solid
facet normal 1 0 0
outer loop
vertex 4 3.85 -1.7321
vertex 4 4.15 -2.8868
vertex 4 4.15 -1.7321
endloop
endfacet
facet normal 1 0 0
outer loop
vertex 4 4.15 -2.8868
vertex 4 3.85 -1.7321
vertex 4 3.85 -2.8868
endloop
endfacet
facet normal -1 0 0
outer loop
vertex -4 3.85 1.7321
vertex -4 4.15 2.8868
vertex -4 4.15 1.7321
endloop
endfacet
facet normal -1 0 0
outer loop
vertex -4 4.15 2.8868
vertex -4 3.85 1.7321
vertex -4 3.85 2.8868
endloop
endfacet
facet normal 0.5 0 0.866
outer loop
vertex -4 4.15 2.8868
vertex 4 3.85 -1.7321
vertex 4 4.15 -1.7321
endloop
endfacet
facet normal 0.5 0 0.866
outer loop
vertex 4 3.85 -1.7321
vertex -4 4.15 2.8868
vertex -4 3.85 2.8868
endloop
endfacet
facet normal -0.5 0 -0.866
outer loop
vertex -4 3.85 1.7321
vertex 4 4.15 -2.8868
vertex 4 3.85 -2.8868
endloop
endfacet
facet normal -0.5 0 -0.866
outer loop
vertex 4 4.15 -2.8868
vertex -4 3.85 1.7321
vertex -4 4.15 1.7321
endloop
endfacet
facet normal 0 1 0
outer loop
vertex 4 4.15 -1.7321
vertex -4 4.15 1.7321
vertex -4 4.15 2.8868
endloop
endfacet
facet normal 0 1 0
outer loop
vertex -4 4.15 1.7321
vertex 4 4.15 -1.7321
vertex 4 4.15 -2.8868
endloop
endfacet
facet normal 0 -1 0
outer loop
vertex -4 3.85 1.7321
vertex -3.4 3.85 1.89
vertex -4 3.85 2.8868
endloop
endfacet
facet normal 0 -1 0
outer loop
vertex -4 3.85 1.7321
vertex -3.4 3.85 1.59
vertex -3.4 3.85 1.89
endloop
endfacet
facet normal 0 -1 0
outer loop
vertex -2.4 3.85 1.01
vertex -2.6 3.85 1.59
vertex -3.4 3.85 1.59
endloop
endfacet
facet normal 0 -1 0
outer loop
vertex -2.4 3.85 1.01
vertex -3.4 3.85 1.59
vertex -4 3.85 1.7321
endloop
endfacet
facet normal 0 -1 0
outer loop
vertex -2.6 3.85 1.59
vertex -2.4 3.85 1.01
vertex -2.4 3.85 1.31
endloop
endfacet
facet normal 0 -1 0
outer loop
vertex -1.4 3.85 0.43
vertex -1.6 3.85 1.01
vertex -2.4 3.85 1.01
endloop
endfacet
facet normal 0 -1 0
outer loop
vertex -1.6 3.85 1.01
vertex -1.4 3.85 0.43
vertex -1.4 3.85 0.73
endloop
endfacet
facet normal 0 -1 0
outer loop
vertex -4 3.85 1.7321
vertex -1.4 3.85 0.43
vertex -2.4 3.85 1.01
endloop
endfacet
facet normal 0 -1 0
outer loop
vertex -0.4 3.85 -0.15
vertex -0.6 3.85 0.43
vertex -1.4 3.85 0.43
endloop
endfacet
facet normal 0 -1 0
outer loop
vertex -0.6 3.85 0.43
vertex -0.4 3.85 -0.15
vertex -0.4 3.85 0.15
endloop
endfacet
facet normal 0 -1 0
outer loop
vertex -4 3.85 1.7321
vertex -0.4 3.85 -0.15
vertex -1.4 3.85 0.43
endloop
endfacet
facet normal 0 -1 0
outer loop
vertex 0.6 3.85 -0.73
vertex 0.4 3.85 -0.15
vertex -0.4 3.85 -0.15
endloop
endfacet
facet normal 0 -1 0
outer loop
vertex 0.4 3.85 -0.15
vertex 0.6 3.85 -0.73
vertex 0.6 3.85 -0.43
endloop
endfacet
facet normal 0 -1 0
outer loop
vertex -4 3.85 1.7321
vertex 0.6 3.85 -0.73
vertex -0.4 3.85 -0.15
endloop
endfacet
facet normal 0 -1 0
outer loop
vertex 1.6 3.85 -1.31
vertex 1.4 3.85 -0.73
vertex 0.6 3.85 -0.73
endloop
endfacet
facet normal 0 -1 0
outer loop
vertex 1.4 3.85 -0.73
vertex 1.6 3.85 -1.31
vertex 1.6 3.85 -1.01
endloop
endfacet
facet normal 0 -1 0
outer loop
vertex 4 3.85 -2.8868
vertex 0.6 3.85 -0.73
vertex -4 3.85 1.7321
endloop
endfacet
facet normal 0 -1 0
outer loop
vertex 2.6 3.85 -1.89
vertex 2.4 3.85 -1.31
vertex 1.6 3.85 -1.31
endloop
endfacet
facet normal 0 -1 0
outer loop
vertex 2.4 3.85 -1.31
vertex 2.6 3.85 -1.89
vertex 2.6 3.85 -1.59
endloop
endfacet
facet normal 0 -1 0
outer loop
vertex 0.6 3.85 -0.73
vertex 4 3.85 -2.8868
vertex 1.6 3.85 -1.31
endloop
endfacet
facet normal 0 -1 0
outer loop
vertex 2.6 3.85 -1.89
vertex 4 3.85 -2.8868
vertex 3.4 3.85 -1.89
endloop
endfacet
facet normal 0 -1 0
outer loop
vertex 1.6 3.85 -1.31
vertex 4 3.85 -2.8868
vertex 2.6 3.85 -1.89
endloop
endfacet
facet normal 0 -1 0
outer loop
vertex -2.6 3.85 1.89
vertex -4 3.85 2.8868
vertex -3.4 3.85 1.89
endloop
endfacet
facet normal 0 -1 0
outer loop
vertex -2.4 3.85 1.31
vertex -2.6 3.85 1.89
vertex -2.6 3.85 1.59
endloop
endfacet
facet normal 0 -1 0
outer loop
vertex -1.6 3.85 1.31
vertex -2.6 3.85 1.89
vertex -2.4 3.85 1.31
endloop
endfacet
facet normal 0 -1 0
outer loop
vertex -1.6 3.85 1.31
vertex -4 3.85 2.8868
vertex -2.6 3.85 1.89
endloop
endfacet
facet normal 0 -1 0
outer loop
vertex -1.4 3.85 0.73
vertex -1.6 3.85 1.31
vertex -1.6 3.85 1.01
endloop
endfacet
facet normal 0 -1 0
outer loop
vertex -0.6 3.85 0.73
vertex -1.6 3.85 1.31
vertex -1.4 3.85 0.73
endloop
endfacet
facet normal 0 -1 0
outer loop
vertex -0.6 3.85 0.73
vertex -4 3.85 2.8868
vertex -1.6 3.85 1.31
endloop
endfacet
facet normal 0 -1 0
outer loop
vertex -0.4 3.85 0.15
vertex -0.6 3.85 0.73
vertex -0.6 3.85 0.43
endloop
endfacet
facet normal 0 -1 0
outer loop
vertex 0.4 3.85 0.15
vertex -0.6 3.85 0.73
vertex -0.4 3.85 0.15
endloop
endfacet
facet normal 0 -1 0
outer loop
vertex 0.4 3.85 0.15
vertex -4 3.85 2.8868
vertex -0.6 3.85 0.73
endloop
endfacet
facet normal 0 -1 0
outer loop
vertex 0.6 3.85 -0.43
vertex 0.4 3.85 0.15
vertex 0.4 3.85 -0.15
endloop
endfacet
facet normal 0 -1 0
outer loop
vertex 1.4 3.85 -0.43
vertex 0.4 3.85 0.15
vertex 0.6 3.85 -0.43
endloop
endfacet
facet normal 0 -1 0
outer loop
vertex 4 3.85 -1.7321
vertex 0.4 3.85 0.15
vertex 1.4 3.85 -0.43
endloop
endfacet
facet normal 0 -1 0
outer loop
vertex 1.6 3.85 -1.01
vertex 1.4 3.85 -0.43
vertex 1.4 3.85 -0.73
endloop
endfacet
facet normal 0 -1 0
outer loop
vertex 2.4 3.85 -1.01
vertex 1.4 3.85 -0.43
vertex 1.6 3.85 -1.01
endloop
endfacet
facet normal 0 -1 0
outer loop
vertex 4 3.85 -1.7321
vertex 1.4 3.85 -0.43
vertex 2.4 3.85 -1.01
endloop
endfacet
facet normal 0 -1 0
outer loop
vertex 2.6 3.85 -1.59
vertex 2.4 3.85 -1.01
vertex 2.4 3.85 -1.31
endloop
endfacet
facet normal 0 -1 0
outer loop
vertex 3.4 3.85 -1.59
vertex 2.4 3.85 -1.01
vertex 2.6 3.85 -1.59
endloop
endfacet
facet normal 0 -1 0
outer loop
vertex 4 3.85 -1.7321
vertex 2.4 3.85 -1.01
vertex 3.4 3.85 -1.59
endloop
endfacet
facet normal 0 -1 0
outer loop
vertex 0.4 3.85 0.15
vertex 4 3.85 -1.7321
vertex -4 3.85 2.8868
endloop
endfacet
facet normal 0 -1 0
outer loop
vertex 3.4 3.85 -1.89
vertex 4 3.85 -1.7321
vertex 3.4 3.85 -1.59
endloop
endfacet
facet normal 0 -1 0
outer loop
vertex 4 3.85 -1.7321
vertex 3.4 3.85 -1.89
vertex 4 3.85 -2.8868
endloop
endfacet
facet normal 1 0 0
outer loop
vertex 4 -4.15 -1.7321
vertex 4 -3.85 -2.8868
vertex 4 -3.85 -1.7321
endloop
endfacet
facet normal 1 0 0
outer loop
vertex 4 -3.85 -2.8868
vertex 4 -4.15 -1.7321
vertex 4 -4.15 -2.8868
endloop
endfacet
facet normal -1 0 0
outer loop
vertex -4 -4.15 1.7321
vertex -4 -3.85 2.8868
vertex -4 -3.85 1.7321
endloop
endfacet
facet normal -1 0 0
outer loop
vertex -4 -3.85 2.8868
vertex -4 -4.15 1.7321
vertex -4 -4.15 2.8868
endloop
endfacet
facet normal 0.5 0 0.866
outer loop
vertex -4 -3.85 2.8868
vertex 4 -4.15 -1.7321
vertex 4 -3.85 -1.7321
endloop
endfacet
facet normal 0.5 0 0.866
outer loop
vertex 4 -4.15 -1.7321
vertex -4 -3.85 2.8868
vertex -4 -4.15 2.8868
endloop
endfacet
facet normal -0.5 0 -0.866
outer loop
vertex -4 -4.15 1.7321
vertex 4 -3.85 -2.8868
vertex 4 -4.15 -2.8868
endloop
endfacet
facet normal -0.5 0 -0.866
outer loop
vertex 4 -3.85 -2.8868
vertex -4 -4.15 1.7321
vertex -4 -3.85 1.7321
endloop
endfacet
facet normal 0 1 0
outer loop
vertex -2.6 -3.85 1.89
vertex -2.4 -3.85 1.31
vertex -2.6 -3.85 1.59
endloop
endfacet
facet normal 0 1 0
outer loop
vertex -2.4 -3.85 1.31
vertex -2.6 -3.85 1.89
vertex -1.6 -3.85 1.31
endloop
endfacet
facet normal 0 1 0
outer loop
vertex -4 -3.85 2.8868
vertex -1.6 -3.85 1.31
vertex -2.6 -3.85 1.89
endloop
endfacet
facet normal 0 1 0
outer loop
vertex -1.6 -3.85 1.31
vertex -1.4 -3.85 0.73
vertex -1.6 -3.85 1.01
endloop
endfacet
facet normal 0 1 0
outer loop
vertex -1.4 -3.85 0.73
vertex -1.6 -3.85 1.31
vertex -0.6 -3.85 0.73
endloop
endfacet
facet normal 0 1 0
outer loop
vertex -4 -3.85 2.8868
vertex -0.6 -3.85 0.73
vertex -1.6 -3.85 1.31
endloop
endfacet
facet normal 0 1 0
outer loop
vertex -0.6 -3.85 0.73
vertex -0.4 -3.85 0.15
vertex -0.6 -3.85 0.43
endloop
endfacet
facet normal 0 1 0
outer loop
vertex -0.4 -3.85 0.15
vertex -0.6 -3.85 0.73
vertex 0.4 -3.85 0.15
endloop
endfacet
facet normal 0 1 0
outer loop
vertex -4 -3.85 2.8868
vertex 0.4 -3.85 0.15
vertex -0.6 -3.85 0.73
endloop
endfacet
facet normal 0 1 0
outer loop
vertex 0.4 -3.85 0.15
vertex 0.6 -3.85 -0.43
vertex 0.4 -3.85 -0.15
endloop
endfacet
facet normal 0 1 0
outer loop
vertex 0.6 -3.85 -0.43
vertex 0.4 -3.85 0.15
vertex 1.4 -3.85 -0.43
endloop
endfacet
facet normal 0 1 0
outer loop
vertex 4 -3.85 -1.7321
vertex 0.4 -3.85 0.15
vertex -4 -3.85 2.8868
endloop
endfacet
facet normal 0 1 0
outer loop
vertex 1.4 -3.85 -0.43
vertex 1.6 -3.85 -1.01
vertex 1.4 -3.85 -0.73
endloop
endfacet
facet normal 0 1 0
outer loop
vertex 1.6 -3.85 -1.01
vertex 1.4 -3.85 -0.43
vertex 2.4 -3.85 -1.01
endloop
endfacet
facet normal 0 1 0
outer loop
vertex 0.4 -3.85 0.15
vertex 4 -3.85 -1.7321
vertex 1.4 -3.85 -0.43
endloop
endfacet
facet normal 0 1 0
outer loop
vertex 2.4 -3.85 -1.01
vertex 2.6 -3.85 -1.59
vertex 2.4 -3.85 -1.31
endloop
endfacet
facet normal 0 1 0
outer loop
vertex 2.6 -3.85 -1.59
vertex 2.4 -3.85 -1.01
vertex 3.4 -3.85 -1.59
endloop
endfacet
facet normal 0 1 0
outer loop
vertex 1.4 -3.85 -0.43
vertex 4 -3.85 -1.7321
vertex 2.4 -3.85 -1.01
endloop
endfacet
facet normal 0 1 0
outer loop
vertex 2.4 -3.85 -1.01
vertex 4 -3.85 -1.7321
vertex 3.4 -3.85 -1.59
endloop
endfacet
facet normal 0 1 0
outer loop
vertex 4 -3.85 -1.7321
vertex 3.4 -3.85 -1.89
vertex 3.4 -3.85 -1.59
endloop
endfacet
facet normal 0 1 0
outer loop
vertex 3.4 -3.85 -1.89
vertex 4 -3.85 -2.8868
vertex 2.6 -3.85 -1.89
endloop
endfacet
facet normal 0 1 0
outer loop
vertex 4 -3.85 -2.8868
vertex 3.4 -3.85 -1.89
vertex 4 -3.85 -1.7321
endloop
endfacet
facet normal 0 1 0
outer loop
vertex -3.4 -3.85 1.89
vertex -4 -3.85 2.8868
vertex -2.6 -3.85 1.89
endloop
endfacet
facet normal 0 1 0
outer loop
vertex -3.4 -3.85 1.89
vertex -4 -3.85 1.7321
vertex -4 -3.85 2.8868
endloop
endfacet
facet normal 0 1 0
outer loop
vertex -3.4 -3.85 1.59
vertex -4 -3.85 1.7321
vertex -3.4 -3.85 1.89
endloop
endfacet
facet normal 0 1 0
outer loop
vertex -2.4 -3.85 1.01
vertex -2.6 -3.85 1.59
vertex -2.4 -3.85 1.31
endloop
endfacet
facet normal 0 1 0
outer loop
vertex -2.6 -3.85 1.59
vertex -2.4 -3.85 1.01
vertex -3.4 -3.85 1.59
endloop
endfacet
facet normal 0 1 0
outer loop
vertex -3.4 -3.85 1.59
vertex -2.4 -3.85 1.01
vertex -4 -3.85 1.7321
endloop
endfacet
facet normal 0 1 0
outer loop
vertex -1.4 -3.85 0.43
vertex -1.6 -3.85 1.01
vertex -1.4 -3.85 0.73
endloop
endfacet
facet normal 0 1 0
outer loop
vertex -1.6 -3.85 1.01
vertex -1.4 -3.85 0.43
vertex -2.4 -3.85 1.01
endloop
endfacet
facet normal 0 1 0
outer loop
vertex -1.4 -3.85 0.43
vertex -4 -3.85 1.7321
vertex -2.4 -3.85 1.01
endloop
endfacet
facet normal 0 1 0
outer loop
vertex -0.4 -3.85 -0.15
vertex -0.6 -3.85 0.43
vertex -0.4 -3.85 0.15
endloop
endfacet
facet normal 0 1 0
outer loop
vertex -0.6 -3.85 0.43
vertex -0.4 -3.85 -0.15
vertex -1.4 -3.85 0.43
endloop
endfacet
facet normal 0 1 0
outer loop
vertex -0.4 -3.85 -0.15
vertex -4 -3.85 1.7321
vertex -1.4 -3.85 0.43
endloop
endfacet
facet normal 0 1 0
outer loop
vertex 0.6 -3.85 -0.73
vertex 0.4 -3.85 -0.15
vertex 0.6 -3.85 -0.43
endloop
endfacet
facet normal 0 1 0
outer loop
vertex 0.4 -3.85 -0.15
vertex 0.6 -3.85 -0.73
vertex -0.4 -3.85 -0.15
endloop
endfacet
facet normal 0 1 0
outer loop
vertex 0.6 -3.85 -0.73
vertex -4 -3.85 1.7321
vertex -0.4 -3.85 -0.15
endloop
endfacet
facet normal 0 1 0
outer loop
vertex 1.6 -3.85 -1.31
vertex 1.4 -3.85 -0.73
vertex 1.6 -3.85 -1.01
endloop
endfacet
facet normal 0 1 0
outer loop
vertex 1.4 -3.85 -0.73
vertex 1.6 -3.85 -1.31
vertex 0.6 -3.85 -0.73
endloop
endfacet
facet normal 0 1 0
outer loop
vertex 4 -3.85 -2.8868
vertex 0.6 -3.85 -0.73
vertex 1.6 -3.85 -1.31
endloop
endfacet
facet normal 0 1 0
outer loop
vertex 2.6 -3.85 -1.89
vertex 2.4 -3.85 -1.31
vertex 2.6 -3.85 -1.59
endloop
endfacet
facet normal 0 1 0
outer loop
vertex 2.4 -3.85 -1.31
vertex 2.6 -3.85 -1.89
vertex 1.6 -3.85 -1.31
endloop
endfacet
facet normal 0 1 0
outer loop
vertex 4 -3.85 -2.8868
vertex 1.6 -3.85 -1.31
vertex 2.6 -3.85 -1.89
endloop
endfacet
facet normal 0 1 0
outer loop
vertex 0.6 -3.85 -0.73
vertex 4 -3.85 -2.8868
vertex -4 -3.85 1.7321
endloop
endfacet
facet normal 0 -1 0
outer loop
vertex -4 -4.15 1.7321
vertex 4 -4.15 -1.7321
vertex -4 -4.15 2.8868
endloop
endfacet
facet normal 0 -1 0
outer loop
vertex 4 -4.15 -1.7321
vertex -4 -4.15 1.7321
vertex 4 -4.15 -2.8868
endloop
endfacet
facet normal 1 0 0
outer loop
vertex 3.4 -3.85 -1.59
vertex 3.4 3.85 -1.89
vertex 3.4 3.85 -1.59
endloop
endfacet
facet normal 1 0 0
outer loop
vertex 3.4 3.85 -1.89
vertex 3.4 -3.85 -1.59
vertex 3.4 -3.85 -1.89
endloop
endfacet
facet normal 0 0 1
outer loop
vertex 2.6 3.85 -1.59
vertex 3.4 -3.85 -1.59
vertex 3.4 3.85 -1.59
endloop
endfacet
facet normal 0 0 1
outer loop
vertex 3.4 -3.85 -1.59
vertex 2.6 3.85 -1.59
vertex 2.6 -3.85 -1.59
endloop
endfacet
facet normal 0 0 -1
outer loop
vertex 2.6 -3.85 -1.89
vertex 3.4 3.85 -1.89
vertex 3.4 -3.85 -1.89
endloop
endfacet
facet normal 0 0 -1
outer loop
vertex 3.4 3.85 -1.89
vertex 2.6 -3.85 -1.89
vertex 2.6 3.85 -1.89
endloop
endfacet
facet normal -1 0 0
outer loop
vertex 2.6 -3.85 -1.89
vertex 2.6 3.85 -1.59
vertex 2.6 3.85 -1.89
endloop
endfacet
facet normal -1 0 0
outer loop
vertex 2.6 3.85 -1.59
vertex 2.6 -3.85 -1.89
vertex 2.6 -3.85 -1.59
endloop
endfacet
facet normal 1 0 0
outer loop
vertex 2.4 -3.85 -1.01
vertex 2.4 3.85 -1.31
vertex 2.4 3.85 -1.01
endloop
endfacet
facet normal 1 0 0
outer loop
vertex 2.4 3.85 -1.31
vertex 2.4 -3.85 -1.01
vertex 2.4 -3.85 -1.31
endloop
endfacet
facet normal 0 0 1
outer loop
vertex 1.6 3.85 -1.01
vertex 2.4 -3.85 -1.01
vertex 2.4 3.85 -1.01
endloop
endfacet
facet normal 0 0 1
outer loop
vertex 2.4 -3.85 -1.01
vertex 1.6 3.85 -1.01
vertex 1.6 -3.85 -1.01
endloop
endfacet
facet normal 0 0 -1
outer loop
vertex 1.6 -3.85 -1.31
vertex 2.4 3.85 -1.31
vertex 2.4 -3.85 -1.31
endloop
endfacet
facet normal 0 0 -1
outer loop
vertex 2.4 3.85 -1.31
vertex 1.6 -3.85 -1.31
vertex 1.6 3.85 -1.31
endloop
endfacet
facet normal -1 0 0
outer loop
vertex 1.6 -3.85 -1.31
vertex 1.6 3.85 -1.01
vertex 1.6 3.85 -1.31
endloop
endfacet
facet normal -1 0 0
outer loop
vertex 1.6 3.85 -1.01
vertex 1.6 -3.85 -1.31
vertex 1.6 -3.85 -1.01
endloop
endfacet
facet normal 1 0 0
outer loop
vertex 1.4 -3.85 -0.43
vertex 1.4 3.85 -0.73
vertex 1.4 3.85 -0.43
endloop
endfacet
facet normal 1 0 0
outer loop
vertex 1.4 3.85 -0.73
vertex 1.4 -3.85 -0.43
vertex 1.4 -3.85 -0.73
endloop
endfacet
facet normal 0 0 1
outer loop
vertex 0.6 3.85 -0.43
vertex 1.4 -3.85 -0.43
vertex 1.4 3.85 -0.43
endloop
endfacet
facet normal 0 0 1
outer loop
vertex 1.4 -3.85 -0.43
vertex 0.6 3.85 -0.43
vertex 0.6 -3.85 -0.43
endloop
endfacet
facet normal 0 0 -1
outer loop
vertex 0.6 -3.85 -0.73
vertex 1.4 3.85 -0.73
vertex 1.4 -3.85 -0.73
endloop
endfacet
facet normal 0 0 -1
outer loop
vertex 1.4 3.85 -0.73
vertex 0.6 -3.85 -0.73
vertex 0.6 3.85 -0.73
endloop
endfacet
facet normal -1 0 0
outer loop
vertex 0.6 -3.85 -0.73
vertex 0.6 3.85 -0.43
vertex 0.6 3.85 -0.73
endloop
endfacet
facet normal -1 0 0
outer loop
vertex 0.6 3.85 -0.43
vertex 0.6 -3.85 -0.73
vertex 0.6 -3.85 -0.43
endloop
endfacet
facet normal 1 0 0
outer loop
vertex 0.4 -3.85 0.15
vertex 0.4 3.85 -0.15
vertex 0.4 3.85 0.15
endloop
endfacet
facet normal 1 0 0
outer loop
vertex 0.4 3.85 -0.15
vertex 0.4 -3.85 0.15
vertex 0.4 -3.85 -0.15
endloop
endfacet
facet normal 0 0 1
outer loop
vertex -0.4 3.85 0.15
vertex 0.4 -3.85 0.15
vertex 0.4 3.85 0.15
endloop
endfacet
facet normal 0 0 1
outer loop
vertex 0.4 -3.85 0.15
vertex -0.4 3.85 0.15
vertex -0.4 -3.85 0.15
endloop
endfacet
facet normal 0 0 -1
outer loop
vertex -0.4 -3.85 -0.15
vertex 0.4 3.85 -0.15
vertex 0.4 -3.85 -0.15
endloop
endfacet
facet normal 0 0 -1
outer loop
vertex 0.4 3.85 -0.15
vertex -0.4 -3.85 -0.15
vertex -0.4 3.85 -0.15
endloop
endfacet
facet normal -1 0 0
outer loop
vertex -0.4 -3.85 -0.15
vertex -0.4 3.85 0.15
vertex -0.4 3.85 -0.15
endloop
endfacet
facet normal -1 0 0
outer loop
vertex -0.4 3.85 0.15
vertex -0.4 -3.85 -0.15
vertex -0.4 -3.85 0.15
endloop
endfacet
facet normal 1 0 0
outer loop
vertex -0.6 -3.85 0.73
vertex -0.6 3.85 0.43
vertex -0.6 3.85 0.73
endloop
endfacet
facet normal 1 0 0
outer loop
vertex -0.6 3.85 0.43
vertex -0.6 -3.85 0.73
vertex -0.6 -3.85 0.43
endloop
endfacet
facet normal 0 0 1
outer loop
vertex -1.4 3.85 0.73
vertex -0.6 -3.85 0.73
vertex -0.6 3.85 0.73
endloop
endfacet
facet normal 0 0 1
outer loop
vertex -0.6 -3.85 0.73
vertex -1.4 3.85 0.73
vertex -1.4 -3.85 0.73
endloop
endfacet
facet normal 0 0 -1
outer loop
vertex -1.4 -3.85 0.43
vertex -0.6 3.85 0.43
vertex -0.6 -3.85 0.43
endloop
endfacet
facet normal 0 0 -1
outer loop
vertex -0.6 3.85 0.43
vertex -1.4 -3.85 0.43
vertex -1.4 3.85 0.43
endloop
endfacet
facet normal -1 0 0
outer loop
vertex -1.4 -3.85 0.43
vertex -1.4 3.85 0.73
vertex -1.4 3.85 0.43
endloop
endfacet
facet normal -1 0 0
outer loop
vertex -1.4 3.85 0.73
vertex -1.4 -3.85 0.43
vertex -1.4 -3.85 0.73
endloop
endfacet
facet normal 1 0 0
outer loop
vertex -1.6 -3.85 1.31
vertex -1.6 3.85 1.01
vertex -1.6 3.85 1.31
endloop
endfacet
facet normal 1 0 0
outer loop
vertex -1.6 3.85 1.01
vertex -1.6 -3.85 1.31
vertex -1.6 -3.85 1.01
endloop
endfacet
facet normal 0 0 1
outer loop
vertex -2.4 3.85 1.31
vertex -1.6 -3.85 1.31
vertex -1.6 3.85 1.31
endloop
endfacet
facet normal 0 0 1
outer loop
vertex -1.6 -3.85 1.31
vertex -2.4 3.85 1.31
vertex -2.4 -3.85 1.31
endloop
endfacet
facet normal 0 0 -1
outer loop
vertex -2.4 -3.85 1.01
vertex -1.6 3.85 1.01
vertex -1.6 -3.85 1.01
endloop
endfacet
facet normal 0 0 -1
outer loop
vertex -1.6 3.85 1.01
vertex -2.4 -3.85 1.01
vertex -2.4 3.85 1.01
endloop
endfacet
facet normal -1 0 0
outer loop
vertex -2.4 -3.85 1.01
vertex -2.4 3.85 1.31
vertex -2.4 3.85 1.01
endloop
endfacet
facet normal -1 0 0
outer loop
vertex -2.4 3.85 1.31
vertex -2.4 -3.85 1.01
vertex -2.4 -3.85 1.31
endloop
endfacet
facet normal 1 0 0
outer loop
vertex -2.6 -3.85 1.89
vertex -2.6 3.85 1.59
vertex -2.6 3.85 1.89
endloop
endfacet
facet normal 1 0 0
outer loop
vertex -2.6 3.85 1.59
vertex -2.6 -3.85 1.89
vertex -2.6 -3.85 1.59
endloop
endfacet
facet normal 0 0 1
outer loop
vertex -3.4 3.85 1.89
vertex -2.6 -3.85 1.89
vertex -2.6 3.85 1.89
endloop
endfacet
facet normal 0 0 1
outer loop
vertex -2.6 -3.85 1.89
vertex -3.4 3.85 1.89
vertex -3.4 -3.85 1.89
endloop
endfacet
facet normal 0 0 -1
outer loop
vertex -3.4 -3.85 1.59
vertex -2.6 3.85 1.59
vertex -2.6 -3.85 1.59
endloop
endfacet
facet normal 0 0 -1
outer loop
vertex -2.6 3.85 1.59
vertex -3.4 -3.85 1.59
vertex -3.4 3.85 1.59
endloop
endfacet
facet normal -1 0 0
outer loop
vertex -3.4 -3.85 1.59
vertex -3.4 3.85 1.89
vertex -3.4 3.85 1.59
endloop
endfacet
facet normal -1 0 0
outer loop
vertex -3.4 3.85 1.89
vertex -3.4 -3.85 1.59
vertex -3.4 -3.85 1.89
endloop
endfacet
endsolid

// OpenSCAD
module Ladder_02(){
        
    module Rail(){
       intersection(){
       cube([8,8,8], center = true);
       rotate([0,30,0])
       cube([16,0.3,1], center = true);     
        }    
    }

    color("#8E5F3A"){
    translate([0,4,0])
    Rail();

    translate([0,-4,0])
    Rail();
    
    } 
    color("#d68f58"){
    for (i=[-3:1:3]) {
          translate([-i,0,i*0.58])
          cube([0.8,8,0.3], center = true);

        }
    }
}

Ladder_02();

// Written by Nicolì Angelo (Gengio) 2024: 
// MIT License

//Permission is hereby granted, free of charge, to any person obtaining a copy of this software and associated documentation files (the "Software"), to deal in the Software without restriction, including without limitation the rights to use, copy, modify, merge, publish, distribute, sublicense, and/or sell copies of the Software, and to permit persons to whom the Software is furnished to do so, subject to the following conditions:

//The above copyright notice and this permission notice shall be included in all copies or substantial portions of the Software.

//THE SOFTWARE IS PROVIDED "AS IS", WITHOUT WARRANTY OF ANY KIND, EXPRESS OR IMPLIED, INCLUDING BUT NOT LIMITED TO THE WARRANTIES OF MERCHANTABILITY, FITNESS FOR A PARTICULAR PURPOSE AND NONINFRINGEMENT. IN NO EVENT SHALL THE AUTHORS OR COPYRIGHT HOLDERS BE LIABLE FOR ANY CLAIM, DAMAGES OR OTHER LIABILITY, WHETHER IN AN ACTION OF CONTRACT, TORT OR OTHERWISE, ARISING FROM, OUT OF OR IN CONNECTION WITH THE SOFTWARE OR THE USE OR OTHER DEALINGS IN THE SOFTWARE.
